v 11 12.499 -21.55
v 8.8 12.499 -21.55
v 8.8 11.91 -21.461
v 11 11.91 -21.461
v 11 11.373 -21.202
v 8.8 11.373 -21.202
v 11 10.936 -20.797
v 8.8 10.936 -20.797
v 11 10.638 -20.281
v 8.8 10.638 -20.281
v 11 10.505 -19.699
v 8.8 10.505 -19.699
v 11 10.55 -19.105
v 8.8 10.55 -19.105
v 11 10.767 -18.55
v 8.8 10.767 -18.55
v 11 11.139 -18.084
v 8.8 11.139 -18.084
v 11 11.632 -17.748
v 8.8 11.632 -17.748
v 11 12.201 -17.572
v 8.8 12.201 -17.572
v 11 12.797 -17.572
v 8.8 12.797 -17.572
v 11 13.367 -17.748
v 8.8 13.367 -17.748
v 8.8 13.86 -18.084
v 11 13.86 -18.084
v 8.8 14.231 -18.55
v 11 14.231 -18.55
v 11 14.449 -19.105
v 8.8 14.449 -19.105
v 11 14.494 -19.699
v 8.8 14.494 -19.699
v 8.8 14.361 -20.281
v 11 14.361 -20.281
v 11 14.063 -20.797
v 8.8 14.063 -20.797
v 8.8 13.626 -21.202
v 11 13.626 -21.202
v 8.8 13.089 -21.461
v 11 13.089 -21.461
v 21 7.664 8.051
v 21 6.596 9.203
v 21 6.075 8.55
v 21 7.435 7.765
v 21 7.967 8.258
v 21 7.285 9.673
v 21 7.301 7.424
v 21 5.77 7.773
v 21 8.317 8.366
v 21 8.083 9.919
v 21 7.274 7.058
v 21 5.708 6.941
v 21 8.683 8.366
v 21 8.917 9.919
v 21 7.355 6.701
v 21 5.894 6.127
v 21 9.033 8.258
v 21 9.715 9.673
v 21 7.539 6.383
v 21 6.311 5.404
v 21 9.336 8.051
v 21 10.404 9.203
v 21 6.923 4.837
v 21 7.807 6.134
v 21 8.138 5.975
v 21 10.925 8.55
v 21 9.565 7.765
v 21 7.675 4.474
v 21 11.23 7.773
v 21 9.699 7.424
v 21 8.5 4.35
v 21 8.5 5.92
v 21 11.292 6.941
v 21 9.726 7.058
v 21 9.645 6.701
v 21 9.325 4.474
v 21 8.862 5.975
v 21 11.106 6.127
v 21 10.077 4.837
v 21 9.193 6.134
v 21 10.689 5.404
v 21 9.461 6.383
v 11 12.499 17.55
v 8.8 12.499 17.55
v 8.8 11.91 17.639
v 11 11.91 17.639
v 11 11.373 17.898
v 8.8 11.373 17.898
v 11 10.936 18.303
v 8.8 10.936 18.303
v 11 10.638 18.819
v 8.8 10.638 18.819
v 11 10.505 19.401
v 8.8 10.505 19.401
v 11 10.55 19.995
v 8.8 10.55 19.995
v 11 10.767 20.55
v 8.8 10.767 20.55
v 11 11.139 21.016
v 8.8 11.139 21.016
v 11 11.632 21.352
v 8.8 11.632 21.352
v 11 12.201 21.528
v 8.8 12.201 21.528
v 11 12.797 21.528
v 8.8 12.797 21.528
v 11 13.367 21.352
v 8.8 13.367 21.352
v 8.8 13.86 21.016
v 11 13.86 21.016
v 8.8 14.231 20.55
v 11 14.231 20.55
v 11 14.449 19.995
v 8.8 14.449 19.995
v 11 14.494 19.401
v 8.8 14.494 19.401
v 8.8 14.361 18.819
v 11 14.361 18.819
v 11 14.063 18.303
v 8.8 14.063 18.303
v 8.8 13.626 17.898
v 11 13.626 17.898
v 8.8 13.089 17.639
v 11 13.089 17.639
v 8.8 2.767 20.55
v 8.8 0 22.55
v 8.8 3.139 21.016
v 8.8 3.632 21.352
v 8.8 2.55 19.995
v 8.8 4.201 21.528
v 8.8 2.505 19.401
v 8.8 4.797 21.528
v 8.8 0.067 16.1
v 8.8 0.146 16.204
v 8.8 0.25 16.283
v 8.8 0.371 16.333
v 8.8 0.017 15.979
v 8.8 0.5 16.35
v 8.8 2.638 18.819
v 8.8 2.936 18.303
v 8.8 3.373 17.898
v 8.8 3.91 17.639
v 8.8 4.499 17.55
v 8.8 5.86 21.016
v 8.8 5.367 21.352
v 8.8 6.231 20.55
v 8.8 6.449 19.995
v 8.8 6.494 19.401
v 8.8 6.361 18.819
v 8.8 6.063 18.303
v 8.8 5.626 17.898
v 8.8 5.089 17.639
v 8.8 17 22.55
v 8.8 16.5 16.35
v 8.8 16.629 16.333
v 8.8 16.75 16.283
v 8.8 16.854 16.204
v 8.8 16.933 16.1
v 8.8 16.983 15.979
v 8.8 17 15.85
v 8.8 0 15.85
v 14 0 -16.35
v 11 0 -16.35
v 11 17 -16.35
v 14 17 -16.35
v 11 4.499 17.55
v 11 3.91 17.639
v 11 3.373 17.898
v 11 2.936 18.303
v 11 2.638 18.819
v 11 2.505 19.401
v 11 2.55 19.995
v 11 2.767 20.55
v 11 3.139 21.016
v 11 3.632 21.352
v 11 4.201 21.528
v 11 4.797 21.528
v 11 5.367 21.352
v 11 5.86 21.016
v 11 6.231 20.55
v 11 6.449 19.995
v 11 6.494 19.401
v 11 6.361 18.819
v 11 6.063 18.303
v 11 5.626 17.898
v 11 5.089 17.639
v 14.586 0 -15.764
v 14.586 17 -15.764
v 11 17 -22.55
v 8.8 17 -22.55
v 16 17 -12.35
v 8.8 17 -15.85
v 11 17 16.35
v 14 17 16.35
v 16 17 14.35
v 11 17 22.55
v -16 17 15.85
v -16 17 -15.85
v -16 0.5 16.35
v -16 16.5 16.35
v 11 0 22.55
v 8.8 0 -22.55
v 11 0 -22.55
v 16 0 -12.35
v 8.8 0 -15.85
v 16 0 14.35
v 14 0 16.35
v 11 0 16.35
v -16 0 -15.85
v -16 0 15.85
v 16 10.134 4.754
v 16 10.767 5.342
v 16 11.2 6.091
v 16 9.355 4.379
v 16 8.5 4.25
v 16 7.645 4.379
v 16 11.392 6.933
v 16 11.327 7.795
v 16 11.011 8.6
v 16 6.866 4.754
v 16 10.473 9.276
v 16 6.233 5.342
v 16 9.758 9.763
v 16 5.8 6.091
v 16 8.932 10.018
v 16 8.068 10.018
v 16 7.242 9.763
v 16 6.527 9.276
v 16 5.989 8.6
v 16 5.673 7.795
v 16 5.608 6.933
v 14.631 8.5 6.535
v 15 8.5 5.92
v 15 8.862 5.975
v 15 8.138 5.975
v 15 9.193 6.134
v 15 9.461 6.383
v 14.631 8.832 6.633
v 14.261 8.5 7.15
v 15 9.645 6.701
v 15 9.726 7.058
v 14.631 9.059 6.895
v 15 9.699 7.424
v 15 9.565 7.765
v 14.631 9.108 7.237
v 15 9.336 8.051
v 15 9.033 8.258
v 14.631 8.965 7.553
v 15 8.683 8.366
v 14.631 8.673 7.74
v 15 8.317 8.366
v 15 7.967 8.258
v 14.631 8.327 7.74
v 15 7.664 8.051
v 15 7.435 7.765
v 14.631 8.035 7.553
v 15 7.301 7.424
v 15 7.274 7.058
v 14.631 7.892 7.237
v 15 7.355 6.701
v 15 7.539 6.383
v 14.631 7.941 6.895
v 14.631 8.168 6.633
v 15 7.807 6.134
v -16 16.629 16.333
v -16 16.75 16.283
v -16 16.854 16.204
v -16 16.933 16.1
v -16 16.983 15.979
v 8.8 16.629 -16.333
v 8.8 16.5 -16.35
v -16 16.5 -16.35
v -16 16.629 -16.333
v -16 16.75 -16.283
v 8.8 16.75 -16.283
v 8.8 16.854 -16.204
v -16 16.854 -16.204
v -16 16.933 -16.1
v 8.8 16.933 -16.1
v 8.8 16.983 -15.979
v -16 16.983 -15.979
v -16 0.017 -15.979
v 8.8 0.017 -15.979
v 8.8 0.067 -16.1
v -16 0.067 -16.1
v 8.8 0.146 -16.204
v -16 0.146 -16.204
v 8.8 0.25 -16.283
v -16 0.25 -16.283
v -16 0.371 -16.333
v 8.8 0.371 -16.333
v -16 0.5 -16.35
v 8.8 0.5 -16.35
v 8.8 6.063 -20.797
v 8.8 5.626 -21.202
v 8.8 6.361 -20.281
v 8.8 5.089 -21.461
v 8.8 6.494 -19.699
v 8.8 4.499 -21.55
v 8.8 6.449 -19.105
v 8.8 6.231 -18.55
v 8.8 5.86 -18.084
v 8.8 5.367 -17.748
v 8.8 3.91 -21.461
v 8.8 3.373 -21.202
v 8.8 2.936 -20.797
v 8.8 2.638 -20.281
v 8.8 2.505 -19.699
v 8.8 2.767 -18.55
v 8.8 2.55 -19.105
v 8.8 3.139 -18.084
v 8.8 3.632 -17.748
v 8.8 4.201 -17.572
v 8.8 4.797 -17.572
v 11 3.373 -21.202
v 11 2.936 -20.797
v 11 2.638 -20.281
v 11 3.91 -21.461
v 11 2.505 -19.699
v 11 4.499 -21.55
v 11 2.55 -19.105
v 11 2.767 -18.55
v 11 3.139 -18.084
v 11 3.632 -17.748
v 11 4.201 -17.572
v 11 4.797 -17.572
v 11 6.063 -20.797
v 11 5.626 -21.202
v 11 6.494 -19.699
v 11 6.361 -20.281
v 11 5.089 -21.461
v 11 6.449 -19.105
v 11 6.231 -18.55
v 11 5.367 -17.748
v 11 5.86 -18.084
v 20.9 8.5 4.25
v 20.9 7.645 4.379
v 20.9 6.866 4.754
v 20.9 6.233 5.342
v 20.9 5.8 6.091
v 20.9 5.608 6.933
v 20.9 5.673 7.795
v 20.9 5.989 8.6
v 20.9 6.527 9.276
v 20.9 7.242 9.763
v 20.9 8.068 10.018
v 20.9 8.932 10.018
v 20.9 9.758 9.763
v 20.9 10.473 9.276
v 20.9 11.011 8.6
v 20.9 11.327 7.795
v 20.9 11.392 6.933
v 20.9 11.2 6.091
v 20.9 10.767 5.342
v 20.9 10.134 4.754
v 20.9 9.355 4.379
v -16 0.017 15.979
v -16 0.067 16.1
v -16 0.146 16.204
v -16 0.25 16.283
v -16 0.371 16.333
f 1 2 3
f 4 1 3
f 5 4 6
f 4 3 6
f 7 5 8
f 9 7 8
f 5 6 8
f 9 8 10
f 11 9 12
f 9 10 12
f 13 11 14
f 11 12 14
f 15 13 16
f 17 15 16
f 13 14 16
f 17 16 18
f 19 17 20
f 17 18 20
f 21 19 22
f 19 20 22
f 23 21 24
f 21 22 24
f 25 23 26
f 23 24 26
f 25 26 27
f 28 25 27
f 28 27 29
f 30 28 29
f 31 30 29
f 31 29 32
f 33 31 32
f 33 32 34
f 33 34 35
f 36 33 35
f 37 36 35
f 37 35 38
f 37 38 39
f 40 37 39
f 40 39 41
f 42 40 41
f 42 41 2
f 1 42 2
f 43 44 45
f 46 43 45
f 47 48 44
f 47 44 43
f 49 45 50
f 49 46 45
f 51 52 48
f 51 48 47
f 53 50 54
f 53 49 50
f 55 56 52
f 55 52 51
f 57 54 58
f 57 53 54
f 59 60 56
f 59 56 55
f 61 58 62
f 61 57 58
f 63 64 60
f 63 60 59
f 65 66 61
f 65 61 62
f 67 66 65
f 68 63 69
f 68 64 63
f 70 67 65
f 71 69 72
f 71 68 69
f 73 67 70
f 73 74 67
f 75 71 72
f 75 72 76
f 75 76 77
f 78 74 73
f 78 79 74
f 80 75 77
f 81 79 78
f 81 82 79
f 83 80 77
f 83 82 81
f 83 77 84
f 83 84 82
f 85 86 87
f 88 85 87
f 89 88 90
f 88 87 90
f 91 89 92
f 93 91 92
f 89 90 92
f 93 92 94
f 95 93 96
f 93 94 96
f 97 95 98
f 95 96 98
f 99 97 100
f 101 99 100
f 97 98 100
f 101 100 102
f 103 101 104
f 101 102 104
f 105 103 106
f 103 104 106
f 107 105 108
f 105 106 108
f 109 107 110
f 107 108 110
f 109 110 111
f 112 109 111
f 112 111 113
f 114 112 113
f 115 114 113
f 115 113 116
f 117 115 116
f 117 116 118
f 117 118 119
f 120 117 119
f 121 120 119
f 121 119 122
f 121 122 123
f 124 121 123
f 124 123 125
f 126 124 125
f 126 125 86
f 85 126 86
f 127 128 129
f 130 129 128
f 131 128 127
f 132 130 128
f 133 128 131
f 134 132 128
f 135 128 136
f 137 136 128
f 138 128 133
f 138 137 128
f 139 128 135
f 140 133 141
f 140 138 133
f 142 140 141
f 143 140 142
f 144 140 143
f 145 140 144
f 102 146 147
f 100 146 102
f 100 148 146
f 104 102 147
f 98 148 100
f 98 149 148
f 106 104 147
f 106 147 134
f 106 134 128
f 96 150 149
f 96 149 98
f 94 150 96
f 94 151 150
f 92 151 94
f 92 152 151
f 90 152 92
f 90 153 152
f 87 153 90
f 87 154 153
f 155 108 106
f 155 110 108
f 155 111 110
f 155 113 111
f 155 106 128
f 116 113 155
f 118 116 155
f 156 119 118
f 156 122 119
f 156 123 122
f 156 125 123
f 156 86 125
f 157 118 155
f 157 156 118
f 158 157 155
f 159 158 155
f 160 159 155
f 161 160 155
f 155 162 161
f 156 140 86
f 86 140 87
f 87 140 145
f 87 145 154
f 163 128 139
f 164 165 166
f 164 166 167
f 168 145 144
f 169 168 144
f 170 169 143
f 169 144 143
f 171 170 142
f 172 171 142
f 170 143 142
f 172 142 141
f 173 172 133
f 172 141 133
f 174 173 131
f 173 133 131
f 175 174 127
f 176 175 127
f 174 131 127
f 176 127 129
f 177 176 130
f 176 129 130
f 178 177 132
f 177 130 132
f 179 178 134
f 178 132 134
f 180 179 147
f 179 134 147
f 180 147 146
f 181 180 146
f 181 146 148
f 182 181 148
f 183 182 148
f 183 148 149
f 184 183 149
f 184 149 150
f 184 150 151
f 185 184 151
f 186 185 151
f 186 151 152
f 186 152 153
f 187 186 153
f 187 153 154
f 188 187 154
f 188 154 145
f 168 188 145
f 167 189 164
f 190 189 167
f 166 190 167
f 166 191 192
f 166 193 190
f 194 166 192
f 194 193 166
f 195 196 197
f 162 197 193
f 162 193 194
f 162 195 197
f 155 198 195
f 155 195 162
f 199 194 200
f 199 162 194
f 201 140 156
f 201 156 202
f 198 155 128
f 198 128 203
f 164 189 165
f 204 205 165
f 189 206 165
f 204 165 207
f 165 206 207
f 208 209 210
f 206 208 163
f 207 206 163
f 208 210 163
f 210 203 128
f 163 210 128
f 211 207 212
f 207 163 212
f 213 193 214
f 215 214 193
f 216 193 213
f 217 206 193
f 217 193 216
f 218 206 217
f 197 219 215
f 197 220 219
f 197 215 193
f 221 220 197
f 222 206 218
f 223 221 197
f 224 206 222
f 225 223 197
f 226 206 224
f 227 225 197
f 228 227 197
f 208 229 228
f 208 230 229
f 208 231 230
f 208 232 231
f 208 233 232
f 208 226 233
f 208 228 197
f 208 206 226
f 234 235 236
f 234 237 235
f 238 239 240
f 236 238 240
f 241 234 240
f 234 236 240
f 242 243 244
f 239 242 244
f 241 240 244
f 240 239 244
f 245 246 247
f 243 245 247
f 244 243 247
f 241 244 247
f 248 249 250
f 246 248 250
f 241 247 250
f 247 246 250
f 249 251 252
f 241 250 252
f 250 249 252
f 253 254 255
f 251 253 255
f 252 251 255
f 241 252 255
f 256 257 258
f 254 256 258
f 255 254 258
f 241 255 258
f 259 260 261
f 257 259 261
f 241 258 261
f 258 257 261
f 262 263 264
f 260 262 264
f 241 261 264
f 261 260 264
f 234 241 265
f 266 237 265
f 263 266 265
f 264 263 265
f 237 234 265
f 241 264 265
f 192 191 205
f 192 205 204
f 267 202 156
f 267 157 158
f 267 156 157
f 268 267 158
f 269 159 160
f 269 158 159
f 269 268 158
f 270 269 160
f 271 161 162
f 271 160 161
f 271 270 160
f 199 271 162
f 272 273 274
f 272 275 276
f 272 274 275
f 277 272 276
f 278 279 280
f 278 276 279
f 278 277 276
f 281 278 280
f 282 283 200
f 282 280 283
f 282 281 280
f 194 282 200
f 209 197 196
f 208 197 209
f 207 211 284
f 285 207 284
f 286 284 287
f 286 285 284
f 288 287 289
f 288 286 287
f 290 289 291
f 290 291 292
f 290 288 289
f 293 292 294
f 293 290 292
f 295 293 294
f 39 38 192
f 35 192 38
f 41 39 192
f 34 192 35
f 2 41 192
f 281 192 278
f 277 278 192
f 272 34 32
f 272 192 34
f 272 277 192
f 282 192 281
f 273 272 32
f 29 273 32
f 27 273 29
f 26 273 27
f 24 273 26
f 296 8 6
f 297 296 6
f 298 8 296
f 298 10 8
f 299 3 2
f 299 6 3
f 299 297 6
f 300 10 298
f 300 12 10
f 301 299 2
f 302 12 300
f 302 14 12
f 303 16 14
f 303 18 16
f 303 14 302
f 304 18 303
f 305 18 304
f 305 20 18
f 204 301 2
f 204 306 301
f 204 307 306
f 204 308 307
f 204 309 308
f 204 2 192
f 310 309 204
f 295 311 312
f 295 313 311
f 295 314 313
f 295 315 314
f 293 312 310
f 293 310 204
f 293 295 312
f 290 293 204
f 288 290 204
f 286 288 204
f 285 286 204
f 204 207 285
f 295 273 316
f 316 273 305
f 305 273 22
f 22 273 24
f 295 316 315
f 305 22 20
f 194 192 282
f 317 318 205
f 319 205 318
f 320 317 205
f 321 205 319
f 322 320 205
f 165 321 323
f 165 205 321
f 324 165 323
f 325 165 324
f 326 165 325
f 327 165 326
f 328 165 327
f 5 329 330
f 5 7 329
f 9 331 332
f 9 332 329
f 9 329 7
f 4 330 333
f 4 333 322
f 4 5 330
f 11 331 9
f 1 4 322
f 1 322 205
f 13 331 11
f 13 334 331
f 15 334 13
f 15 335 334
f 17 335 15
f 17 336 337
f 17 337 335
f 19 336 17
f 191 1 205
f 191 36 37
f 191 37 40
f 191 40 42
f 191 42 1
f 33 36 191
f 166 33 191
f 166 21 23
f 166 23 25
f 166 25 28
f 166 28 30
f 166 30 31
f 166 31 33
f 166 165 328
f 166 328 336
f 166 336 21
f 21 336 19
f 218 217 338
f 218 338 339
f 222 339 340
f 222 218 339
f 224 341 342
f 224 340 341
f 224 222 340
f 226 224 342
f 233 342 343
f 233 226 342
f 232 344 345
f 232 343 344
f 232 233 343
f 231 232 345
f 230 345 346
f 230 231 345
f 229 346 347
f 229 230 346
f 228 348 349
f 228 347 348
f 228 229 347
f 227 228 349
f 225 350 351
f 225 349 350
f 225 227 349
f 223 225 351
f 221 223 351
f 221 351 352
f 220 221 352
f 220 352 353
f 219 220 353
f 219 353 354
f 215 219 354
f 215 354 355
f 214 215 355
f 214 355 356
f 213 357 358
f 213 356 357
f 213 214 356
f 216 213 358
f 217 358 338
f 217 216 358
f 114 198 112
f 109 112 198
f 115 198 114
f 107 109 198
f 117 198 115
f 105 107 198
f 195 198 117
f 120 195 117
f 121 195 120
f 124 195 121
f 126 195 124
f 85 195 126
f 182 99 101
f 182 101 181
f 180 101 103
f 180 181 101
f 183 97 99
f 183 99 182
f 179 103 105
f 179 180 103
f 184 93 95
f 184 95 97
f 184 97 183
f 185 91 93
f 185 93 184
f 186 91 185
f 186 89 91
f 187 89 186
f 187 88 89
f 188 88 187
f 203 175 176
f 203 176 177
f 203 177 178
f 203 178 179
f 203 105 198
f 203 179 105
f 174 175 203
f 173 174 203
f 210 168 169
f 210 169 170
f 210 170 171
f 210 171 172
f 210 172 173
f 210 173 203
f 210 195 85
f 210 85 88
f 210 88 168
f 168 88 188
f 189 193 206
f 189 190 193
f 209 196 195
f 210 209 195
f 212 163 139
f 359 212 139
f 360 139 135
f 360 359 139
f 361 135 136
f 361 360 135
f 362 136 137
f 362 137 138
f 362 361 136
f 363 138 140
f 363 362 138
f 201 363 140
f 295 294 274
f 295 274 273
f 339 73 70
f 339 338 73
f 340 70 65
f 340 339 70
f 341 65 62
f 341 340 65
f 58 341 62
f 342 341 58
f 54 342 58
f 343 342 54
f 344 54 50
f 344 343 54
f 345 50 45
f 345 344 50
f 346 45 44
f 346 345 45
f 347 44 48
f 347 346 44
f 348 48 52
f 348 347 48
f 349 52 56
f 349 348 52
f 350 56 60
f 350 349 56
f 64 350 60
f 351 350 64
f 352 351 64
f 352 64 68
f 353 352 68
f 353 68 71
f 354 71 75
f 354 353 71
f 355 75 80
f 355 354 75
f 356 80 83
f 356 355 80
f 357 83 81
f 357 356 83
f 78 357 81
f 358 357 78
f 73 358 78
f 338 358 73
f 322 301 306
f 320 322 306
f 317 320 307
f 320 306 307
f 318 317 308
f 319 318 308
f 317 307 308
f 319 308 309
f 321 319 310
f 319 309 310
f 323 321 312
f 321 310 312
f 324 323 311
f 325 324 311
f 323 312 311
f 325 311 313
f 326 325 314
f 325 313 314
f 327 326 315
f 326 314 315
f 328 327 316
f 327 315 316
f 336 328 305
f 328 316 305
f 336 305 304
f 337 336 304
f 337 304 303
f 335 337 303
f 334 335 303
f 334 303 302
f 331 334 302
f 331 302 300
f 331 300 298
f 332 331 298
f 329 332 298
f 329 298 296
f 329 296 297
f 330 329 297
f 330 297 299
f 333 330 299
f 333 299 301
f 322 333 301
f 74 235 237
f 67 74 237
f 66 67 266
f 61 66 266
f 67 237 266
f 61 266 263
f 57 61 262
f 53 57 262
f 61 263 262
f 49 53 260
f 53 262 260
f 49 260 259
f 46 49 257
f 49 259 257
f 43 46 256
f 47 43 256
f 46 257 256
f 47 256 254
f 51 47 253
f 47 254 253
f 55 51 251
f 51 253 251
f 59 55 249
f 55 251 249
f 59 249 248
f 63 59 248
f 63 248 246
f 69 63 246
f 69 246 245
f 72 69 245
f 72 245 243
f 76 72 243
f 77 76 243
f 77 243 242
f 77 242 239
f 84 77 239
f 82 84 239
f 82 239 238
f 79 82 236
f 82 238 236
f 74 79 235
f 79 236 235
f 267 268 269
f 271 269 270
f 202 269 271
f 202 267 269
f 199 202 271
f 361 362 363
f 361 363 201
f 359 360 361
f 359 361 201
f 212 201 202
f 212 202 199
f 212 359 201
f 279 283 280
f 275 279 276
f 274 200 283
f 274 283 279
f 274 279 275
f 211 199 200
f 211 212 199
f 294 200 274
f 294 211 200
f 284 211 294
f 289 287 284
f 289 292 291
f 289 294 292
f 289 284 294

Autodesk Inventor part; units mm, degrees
ref_plane "YZ Plane" through (0, 0, 0) normal (1, 0, 0) x (0, 1, 0)
ref_plane "XZ Plane" through (0, 0, 0) normal (0, 1, 0) x (-1, 0, 0)
ref_plane "XY Plane" through (0, 0, 0) normal (0, 0, 1) x (1, 0, 0)
sketch "Sketch1" plane through (0, 0, 0) normal (0, 1, 0) x (-1, 0, 0)
  line L0 (-16, 16.35) -> (16, 16.35)
  line L1 (16, 16.35) -> (16, -16.35)
  line L2 (16, -16.35) -> (-16, -16.35)
  line L3 (-16, -16.35) -> (-16, 16.35)
  line L4 (-16, 16.35) -> (16, -16.35) construction
  line L5 (16, 16.35) -> (-16, -16.35) construction
  point P0 (0, 0)
  dimension "d0" = 32
  dimension "d1" = 32.7
extrude "Extrusion1" add sketch "Sketch1" along normal blind 17
chamfer "Chamfer1" distance 2 angle 45 2 edges at (16, 8.5, 16.35) (16, 8.5, -16.35)
chamfer "Chamfer2" distance 2 angle 45 1 edges at (16, 8.5, -14.35)
sketch "Sketch3" plane through (16, 0, 14.35) normal (1, 0, 0) x (0, 0, -1)
  line L0 (-2, 17) -> (-2, 0) projected
  circle A0 centre (7.2, 8.5) radius 2.9
  point P0 (14.35, 0)
  point P1 (-2, 8.5)
  dimension "d10" = 9.2
  dimension "d11" = 5.8
extrude "Extrusion2" add sketch "Sketch3" along normal blind 5
sketch "Sketch4" plane through (-16, 0, 16.35) normal (0, 0, 1) x (1, 0, 0)
  line L0 (30, 17) -> (0, 17) projected
  line L1 (24.8, 17) -> (27, 17)
  line L2 (27, 17) -> (27, 0)
  line L3 (27, 0) -> (24.8, 0)
  line L4 (24.8, 0) -> (24.8, 17)
  line L5 (32, 0) -> (32, 17) projected
  point P0 (16, 0)
  point P1 (25.9, 0)
  dimension "d14" = 5
  dimension "d15" = 2.2
extrude "Extrusion3" add sketch "Sketch4" along normal blind 6.2
sketch "Sketch5" plane through (11, 0, 16.35) normal (1, 0, 0) x (0, 0, -1)
  line L0 (0, 17) -> (0, 0) projected
  line L1 (0, 17) -> (-6.2, 17) projected
  line L2 (-6.2, 0) -> (-6.2, 17) projected
  line L3 (0, 0) -> (-6.2, 0) projected
  line L4 (0, 17) -> (-6.2, 17) construction
  line L5 (-3.2, 17) -> (-3.2, 12.4994) construction
  line L6 (-3.2, 12.4994) -> (-3.2, 4.4994) construction
  line L7 (-3.2, 4.4994) -> (-3.1, 0) construction
  point P0 (16.35, 0)
  dimension "d18" = 3
  dimension "d19" = 8
hole "Hole1" at (11, 12.4994, 19.55) at (11, 4.4994, 19.55) direction (-1, 0, 0) diameter 4 depth 8 tip angle 118
sketch "Sketch6" plane through (-16, 0, -16.35) normal (0, 0, -1) x (-1, 0, 0)
  line L0 (-27, 17) -> (-24.8, 17) projected
  line L1 (-24.8, 17) -> (-24.8, 0) projected
  line L2 (-24.8, 0) -> (-27, 0) projected
  line L3 (-27, 0) -> (-27, 17) projected
  line L4 (-27, 17) -> (-24.8, 17)
  line L5 (-24.8, 17) -> (-24.8, 0)
  line L6 (-24.8, 0) -> (-27, 0)
  line L7 (-27, 0) -> (-27, 17)
  point P0 (-16, 0)
extrude "Extrusion4" add sketch "Sketch6" along normal blind 6.2
sketch "Sketch7" plane through (11, 0, -16.35) normal (1, 0, 0) x (0, 0, -1)
  circle A0 centre (-35.9, 12.4994) radius 2 projected
  circle A1 centre (-35.9, 4.4994) radius 2 projected
  line L0 (6.2, 17) -> (6.2, 0) projected
  point P0 (-16.35, 0)
  point P1 (3.2, 12.4994)
  point P2 (3.2, 4.4994)
  dimension "d29" = 3
hole "Hole2" at (11, 12.4994, -19.55) at (11, 4.4994, -19.55) direction (-1, 0, 0) diameter 4 depth 8 tip angle 118
chamfer "Chamfer3" distance 0.1 angle 45 1 edges at (21, 8.5, 10.05)
fillet "Fillet1" radius 0.5 4 edges at (-3.6, 17, 16.35) (-3.6, 17, -16.35) (-3.6, 0, 16.35) (-3.6, 0, -16.35)
hole "Hole3" at (21, 8.5, 7.15) direction (-1, 0, 0) diameter 2.459 depth 6 tip angle 118 thread size "M3x0.5" class "6H" standard "ISO Metric profile"
properties part number "Corona-MG339MG"
